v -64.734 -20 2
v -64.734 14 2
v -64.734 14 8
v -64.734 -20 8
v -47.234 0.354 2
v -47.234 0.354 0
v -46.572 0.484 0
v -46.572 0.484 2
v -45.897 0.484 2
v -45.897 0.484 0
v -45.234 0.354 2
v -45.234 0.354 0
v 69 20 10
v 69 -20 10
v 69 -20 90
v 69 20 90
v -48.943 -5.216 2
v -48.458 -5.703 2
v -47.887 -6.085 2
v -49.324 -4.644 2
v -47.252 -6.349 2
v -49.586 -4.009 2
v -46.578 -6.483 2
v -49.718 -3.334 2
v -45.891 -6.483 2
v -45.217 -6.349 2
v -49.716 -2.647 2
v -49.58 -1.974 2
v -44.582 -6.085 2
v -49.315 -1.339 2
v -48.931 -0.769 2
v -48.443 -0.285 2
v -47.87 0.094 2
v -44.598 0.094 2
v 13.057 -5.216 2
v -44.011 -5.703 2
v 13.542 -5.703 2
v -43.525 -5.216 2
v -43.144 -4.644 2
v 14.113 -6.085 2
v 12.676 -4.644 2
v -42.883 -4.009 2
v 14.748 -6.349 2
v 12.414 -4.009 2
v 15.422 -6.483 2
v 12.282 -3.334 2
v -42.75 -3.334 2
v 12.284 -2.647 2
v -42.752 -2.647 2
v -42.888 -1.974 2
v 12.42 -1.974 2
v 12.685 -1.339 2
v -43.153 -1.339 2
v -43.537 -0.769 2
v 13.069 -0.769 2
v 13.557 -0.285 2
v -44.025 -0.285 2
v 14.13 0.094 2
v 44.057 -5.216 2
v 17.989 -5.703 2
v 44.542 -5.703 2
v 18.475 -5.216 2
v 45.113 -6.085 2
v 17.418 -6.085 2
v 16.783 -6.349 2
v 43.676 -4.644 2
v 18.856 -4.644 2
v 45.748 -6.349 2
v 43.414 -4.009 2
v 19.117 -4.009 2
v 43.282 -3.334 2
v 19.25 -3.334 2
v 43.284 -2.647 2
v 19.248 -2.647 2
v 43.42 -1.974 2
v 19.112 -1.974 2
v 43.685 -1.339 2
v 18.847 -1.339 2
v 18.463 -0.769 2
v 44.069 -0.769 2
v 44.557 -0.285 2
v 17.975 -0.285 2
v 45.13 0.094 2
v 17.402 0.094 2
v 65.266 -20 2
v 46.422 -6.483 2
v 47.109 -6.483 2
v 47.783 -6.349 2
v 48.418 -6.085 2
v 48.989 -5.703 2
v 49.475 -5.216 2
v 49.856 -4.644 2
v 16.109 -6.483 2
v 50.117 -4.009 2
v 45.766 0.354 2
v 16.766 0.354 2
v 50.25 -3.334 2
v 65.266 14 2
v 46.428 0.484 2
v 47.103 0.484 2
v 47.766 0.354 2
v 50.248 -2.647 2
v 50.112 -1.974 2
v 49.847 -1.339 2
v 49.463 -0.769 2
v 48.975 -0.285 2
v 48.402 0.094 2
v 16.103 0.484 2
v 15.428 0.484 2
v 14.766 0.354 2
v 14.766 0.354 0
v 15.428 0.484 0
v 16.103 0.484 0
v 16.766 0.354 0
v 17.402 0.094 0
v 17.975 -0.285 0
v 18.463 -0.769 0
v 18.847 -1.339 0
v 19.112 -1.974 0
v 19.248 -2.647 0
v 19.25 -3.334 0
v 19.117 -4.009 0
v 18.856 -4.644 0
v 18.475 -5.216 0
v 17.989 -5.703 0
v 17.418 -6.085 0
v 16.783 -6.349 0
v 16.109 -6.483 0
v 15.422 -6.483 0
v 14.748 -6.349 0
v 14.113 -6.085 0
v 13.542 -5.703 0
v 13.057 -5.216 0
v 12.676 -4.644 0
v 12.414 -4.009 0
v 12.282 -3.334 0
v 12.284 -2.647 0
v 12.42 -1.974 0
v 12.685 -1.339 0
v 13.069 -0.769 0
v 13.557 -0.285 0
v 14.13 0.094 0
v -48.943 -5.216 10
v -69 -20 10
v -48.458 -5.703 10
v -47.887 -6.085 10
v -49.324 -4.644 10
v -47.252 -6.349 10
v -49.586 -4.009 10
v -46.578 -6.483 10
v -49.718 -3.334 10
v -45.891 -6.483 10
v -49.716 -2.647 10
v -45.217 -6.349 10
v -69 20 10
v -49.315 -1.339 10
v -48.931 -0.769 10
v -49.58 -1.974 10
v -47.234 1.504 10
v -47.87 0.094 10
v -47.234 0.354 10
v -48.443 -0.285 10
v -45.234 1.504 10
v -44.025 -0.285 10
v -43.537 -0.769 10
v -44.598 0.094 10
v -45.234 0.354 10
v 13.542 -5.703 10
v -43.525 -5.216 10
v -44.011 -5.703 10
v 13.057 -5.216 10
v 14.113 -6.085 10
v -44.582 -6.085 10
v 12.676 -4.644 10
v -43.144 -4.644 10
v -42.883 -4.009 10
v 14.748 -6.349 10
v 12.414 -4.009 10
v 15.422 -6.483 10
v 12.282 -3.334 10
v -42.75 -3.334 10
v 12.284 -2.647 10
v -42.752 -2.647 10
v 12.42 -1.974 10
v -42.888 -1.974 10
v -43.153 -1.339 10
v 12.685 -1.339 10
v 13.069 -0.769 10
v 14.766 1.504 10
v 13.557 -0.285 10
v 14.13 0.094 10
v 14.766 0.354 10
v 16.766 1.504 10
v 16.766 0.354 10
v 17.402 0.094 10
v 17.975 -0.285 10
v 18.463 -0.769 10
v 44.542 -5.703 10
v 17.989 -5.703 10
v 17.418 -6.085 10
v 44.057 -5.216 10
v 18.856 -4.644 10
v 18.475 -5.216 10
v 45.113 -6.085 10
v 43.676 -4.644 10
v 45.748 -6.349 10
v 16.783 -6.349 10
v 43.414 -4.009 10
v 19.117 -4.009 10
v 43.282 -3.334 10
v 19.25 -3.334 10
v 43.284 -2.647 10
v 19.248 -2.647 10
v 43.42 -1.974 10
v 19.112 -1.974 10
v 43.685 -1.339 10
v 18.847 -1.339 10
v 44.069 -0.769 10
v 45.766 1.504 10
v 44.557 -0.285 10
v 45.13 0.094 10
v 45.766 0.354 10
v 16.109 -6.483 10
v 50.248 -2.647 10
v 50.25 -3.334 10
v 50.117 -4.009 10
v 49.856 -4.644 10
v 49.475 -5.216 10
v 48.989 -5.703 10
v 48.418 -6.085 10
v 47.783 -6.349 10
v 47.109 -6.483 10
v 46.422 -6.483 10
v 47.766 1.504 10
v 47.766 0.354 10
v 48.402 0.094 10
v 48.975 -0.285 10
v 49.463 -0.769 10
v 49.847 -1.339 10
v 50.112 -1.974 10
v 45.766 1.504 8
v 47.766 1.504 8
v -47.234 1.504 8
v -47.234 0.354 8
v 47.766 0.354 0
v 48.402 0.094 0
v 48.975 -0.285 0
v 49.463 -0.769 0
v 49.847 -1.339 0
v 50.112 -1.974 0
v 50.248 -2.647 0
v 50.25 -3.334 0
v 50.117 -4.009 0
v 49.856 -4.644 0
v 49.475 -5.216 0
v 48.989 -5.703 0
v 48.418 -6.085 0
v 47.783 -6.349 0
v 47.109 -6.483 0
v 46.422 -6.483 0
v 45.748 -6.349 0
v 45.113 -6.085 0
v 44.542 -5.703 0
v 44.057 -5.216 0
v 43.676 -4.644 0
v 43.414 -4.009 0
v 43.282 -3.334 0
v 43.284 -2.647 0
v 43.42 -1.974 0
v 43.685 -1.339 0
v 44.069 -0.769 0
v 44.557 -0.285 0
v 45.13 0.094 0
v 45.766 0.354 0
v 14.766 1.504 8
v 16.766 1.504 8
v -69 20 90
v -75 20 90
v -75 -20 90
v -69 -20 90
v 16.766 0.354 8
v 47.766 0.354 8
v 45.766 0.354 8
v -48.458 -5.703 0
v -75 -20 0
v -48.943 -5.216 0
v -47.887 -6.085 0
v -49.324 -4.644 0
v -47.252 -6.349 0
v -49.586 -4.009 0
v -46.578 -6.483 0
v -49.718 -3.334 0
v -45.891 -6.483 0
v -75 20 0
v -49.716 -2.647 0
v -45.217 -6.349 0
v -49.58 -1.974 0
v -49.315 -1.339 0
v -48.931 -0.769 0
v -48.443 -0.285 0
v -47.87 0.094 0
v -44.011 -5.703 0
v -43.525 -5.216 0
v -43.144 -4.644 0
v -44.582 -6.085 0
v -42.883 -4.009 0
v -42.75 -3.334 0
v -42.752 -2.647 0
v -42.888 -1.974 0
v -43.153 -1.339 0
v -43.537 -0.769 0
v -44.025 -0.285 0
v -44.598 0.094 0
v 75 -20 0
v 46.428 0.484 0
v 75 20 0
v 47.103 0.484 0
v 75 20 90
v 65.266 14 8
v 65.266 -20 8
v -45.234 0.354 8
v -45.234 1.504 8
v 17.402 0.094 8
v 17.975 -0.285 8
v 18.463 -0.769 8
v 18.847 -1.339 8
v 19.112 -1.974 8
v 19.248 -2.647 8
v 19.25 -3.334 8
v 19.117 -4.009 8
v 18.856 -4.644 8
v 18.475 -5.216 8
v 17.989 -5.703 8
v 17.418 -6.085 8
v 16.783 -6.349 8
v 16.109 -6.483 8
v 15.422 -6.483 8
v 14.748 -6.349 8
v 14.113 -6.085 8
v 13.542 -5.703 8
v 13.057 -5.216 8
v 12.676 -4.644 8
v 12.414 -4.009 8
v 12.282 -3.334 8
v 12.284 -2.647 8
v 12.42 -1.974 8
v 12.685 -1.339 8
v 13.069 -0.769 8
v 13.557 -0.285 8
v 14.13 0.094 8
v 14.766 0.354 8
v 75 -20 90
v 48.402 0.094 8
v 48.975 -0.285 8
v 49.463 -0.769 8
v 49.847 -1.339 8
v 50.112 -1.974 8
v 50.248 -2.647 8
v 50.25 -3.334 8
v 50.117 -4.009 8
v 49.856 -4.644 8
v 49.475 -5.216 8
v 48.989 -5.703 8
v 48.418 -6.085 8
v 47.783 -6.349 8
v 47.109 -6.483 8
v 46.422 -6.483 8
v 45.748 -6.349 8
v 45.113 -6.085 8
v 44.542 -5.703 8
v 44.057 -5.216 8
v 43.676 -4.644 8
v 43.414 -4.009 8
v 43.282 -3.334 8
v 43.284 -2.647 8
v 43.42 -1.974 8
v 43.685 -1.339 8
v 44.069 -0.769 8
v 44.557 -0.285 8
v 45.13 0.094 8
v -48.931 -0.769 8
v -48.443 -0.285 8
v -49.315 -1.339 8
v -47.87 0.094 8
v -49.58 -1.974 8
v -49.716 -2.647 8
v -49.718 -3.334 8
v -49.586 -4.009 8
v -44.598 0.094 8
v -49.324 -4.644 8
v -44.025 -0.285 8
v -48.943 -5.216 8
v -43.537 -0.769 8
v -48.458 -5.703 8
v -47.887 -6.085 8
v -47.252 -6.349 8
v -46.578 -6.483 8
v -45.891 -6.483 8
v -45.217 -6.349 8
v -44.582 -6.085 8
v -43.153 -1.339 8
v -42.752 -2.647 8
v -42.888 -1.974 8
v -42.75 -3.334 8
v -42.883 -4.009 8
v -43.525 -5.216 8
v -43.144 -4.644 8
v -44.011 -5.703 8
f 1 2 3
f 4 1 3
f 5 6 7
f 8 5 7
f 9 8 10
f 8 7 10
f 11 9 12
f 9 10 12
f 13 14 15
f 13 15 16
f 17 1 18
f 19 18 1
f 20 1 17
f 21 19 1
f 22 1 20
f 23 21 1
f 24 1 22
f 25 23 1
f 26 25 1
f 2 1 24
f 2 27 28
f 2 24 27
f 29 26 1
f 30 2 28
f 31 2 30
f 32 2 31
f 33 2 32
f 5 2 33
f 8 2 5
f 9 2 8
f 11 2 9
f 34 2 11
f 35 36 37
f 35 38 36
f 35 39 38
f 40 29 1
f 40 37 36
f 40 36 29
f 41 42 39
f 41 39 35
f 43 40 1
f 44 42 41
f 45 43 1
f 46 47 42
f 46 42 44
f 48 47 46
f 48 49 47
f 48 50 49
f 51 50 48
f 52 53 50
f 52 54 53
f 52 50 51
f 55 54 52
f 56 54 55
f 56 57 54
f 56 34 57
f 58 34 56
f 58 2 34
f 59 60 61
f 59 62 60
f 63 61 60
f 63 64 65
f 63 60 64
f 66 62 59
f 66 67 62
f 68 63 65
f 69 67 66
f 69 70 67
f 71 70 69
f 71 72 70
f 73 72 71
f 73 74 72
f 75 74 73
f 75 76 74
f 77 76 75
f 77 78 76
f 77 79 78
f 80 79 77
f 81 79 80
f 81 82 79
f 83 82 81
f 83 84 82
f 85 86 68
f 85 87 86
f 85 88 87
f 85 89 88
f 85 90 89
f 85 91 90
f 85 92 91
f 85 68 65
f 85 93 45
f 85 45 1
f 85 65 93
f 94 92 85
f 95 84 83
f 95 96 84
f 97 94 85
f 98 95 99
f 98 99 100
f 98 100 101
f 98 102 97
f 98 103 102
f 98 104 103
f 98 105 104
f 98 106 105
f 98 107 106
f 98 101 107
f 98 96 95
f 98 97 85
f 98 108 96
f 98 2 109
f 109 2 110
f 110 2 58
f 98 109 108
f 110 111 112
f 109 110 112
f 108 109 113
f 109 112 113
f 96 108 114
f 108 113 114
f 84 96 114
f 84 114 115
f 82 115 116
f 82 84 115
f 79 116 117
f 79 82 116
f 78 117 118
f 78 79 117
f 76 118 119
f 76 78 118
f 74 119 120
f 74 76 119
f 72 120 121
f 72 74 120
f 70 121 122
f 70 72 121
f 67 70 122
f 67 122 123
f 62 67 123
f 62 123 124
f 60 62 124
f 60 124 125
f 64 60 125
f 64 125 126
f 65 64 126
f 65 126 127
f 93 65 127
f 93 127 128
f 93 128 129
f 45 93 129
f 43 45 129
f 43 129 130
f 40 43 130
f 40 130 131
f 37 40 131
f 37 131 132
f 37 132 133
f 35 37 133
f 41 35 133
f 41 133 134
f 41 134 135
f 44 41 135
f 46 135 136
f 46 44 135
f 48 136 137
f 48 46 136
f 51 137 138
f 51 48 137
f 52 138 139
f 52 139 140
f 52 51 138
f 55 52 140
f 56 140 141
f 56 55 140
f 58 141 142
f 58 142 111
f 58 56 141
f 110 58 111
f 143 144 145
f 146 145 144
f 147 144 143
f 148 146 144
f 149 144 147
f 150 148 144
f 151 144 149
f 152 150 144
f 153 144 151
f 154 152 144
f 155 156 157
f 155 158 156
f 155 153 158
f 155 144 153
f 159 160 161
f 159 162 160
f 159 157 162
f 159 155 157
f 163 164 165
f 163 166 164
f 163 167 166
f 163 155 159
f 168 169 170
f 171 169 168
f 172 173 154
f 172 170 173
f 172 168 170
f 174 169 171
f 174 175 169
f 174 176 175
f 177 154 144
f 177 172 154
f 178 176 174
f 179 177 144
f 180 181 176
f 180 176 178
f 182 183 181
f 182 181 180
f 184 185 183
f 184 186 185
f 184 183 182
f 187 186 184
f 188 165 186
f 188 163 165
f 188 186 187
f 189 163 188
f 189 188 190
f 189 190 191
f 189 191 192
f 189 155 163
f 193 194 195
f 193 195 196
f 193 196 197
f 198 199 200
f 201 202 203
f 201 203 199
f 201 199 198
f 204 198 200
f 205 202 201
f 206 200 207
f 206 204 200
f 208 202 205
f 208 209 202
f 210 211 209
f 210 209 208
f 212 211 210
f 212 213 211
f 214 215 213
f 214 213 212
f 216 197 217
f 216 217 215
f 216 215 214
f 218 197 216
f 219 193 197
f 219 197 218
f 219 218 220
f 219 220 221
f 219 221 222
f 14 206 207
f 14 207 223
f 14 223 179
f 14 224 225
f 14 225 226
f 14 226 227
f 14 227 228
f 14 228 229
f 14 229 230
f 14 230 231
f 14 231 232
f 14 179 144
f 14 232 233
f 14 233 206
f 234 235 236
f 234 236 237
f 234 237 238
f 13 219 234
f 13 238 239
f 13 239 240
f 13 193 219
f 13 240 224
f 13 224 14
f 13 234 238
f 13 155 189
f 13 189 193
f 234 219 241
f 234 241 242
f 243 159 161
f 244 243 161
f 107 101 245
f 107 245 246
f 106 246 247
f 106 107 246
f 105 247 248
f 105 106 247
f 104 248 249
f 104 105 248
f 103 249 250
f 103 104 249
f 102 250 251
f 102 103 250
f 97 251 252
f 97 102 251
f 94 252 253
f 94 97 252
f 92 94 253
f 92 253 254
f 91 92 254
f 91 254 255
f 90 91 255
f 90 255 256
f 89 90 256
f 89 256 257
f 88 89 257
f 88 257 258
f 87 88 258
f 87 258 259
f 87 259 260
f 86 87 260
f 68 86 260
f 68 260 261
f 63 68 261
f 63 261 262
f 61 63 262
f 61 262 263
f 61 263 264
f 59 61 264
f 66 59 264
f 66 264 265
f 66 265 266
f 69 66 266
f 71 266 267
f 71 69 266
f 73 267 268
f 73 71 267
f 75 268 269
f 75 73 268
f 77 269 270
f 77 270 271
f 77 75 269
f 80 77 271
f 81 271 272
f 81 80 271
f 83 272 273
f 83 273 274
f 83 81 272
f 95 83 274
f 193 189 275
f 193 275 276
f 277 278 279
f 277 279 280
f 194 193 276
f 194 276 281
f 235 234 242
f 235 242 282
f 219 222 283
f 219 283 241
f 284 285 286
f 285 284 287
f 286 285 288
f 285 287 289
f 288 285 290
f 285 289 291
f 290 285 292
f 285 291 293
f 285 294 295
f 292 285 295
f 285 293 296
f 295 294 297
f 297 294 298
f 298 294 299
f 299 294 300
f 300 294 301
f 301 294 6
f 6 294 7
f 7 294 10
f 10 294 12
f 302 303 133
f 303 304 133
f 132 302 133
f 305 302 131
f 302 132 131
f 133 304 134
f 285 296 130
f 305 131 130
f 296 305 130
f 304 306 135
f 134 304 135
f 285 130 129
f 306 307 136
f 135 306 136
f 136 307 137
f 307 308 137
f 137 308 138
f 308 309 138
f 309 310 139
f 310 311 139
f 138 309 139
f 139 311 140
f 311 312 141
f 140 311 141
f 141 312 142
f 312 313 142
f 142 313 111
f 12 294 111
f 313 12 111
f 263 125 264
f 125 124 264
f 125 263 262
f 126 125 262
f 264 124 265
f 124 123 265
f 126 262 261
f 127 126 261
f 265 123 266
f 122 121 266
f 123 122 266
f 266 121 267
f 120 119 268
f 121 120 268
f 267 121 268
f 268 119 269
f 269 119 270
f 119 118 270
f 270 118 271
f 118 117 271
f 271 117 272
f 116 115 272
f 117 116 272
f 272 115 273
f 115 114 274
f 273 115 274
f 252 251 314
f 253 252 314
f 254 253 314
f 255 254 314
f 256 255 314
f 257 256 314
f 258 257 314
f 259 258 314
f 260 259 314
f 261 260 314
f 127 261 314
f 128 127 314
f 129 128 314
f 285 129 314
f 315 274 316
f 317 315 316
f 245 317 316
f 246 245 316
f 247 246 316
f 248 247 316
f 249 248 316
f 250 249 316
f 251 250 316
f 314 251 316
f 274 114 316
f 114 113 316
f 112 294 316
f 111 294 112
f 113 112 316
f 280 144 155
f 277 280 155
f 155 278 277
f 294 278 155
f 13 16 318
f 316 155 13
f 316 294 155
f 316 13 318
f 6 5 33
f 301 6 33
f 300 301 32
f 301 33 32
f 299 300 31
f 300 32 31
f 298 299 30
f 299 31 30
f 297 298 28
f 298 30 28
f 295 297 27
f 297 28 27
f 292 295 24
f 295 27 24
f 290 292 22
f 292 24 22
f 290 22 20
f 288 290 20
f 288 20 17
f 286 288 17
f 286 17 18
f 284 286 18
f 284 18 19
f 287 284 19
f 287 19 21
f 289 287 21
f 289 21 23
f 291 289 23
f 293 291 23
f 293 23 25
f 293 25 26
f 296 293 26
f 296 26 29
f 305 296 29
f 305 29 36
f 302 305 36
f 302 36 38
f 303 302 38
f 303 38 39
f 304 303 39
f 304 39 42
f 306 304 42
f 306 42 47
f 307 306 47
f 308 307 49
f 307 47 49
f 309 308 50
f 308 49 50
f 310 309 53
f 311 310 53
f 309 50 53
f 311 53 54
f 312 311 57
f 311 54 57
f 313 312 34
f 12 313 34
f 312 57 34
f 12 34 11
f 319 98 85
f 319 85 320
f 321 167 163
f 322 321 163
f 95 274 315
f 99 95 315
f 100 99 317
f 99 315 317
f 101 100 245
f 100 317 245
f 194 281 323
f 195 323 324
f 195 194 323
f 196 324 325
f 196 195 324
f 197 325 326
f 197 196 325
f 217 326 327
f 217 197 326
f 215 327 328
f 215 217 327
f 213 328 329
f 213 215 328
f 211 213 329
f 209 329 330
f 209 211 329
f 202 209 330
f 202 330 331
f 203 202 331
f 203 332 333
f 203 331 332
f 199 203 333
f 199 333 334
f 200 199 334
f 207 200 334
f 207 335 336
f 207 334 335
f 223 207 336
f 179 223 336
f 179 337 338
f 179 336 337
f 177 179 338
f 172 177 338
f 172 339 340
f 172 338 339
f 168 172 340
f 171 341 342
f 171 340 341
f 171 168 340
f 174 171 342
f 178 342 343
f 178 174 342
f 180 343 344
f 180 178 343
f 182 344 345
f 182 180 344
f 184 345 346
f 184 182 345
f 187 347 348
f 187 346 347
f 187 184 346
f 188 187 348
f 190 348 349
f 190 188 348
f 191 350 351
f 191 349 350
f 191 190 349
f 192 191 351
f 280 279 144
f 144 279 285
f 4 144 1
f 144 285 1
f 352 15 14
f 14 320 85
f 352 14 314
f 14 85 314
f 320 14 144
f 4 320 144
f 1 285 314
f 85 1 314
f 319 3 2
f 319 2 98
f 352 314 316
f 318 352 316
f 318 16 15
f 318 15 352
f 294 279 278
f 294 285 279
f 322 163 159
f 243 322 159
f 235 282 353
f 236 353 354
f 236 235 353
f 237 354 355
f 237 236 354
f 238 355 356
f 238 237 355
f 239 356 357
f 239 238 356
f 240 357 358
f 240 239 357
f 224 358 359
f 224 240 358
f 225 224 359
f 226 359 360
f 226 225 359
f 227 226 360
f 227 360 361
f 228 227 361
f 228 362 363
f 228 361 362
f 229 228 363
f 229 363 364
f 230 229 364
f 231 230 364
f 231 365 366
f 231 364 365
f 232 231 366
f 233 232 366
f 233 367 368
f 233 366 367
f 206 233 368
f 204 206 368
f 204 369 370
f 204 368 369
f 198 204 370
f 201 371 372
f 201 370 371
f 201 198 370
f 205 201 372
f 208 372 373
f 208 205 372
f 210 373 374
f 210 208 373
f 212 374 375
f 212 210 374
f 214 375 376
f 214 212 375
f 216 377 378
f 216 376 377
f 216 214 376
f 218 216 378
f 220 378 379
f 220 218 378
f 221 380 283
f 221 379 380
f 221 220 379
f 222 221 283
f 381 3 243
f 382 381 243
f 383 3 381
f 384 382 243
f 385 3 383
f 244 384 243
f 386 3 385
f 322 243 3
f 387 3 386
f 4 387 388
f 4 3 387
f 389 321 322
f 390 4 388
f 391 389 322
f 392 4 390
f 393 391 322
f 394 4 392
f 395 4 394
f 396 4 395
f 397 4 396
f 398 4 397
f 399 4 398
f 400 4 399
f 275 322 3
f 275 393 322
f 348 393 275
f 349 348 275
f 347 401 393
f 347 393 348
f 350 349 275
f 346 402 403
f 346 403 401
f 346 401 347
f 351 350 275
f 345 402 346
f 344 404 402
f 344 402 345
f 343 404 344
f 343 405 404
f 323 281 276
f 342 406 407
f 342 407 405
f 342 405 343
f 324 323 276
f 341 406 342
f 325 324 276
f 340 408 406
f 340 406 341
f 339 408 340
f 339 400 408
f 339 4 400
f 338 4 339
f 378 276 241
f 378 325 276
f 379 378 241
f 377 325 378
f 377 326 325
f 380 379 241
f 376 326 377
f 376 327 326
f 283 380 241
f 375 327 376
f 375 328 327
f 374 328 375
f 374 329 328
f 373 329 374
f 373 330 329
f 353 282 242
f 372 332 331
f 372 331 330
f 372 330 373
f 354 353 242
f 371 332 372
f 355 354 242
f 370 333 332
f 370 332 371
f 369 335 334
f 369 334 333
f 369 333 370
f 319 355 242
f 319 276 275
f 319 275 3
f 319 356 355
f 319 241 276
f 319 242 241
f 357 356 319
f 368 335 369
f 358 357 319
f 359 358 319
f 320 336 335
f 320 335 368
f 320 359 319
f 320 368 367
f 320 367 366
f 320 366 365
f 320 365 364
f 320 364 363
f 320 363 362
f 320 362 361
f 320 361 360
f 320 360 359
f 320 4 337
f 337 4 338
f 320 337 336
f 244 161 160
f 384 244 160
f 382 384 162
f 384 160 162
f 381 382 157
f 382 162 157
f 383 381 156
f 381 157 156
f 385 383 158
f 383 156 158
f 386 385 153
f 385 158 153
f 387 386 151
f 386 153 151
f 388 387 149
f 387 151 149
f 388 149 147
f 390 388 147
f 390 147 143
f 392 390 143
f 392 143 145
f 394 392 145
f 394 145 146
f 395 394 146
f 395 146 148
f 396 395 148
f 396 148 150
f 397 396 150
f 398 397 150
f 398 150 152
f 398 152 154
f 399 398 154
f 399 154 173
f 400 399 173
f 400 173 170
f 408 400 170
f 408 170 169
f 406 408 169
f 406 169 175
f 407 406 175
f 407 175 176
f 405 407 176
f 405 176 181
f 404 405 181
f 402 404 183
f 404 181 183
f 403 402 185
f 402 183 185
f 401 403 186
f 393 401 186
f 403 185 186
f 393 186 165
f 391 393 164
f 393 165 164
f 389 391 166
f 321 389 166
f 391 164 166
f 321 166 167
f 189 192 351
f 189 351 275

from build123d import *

# Parameters (mm, degrees)
SKETCH1_W           = 150
SKETCH1_H           = 40
BOSS_EXTRUDE1_DEPTH = 10
SKETCH2_W           = 130
SKETCH2_H           = 6
CUT_EXTRUDE1_DEPTH  = 34
CUT_EXTRUDE3_DEPTH  = 10
BOSS_EXTRUDE2_DEPTH = 2
SKETCH5_W           = 6
SKETCH5_H           = 40
BOSS_EXTRUDE3_DEPTH = 80


with BuildPart() as part:
    # Sketch1 → Boss-Extrude1 (new body)
    with BuildSketch(Plane.XY):
        Rectangle(SKETCH1_W, SKETCH1_H)
    extrude(amount=BOSS_EXTRUDE1_DEPTH)

    # Sketch2 → Cut-Extrude1 (cut)
    with BuildSketch(Plane.XZ.offset(20)):
        with Locations((0.265824487, 5)):
            Rectangle(SKETCH2_W, SKETCH2_H)
    extrude(amount=-CUT_EXTRUDE1_DEPTH, mode=Mode.SUBTRACT)

    # Sketch3 → Cut-Extrude3 (cut)
    with BuildSketch(Plane.XY.offset(10)):
        with BuildLine():
            Line((16.765824487, 1.504101966), (16.765824487, 0.354101966))
            ThreePointArc((16.765824487, 0.354101966), (15.765824487, -6.5), (14.765824487, 0.354101966))
            Line((14.765824487, 0.354101966), (14.765824487, 1.504101966))
            Line((14.765824487, 1.504101966), (16.765824487, 1.504101966))
        make_face()
        with BuildLine():
            Line((-45.234175513, 1.504101966), (-47.234175513, 1.504101966))
            Line((-47.234175513, 1.504101966), (-47.234175513, 0.354101966))
            ThreePointArc((-47.234175513, 0.354101966), (-46.234175513, -6.5), (-45.234175513, 0.354101966))
            Line((-45.234175513, 0.354101966), (-45.234175513, 1.504101966))
        make_face()
        with BuildLine():
            Line((47.765824487, 1.504101966), (47.765824487, 0.354101966))
            ThreePointArc((47.765824487, 0.354101966), (46.765824487, -6.5), (45.765824487, 0.354101966))
            Line((45.765824487, 0.354101966), (45.765824487, 1.504101966))
            Line((45.765824487, 1.504101966), (47.765824487, 1.504101966))
        make_face()
    extrude(amount=-CUT_EXTRUDE3_DEPTH, mode=Mode.SUBTRACT)

    # Sketch4 → Boss-Extrude2 (add)
    with BuildSketch(Plane(origin=(0, 0, 0), x_dir=(-1, 0, 0), z_dir=(0, 0, -1))):
        with BuildLine():
            Line((-47.765824487, 0.354101966), (-47.765824487, 1.504101966))
            Line((-47.765824487, 1.504101966), (-45.765824487, 1.504101966))
            Line((-45.765824487, 1.504101966), (-45.765824487, 0.354101966))
            ThreePointArc((-45.765824487, 0.354101966), (-46.765824487, 0.5), (-47.765824487, 0.354101966))
        make_face()
        with BuildLine():
            Line((-14.765824487, 1.504101966), (-14.765824487, 0.354101966))
            ThreePointArc((-14.765824487, 0.354101966), (-15.765824487, 0.5), (-16.765824487, 0.354101966))
            Line((-16.765824487, 0.354101966), (-16.765824487, 1.504101966))
            Line((-16.765824487, 1.504101966), (-14.765824487, 1.504101966))
        make_face()
        with BuildLine():
            Line((47.234175513, 1.504101966), (47.234175513, 0.354101966))
            ThreePointArc((47.234175513, 0.354101966), (46.234175513, 0.5), (45.234175513, 0.354101966))
            Line((45.234175513, 0.354101966), (45.234175513, 1.504101966))
            Line((45.234175513, 1.504101966), (47.234175513, 1.504101966))
        make_face()
    extrude(amount=-BOSS_EXTRUDE2_DEPTH)

    # Sketch5 → Boss-Extrude3 (add)
    with BuildSketch(Plane.XY.offset(10)):
        with Locations((-72, 0)):
            Rectangle(SKETCH5_W, SKETCH5_H)
        with Locations((72, 0)):
            Rectangle(SKETCH5_W, SKETCH5_H)
    extrude(amount=BOSS_EXTRUDE3_DEPTH)


solid = part.part
